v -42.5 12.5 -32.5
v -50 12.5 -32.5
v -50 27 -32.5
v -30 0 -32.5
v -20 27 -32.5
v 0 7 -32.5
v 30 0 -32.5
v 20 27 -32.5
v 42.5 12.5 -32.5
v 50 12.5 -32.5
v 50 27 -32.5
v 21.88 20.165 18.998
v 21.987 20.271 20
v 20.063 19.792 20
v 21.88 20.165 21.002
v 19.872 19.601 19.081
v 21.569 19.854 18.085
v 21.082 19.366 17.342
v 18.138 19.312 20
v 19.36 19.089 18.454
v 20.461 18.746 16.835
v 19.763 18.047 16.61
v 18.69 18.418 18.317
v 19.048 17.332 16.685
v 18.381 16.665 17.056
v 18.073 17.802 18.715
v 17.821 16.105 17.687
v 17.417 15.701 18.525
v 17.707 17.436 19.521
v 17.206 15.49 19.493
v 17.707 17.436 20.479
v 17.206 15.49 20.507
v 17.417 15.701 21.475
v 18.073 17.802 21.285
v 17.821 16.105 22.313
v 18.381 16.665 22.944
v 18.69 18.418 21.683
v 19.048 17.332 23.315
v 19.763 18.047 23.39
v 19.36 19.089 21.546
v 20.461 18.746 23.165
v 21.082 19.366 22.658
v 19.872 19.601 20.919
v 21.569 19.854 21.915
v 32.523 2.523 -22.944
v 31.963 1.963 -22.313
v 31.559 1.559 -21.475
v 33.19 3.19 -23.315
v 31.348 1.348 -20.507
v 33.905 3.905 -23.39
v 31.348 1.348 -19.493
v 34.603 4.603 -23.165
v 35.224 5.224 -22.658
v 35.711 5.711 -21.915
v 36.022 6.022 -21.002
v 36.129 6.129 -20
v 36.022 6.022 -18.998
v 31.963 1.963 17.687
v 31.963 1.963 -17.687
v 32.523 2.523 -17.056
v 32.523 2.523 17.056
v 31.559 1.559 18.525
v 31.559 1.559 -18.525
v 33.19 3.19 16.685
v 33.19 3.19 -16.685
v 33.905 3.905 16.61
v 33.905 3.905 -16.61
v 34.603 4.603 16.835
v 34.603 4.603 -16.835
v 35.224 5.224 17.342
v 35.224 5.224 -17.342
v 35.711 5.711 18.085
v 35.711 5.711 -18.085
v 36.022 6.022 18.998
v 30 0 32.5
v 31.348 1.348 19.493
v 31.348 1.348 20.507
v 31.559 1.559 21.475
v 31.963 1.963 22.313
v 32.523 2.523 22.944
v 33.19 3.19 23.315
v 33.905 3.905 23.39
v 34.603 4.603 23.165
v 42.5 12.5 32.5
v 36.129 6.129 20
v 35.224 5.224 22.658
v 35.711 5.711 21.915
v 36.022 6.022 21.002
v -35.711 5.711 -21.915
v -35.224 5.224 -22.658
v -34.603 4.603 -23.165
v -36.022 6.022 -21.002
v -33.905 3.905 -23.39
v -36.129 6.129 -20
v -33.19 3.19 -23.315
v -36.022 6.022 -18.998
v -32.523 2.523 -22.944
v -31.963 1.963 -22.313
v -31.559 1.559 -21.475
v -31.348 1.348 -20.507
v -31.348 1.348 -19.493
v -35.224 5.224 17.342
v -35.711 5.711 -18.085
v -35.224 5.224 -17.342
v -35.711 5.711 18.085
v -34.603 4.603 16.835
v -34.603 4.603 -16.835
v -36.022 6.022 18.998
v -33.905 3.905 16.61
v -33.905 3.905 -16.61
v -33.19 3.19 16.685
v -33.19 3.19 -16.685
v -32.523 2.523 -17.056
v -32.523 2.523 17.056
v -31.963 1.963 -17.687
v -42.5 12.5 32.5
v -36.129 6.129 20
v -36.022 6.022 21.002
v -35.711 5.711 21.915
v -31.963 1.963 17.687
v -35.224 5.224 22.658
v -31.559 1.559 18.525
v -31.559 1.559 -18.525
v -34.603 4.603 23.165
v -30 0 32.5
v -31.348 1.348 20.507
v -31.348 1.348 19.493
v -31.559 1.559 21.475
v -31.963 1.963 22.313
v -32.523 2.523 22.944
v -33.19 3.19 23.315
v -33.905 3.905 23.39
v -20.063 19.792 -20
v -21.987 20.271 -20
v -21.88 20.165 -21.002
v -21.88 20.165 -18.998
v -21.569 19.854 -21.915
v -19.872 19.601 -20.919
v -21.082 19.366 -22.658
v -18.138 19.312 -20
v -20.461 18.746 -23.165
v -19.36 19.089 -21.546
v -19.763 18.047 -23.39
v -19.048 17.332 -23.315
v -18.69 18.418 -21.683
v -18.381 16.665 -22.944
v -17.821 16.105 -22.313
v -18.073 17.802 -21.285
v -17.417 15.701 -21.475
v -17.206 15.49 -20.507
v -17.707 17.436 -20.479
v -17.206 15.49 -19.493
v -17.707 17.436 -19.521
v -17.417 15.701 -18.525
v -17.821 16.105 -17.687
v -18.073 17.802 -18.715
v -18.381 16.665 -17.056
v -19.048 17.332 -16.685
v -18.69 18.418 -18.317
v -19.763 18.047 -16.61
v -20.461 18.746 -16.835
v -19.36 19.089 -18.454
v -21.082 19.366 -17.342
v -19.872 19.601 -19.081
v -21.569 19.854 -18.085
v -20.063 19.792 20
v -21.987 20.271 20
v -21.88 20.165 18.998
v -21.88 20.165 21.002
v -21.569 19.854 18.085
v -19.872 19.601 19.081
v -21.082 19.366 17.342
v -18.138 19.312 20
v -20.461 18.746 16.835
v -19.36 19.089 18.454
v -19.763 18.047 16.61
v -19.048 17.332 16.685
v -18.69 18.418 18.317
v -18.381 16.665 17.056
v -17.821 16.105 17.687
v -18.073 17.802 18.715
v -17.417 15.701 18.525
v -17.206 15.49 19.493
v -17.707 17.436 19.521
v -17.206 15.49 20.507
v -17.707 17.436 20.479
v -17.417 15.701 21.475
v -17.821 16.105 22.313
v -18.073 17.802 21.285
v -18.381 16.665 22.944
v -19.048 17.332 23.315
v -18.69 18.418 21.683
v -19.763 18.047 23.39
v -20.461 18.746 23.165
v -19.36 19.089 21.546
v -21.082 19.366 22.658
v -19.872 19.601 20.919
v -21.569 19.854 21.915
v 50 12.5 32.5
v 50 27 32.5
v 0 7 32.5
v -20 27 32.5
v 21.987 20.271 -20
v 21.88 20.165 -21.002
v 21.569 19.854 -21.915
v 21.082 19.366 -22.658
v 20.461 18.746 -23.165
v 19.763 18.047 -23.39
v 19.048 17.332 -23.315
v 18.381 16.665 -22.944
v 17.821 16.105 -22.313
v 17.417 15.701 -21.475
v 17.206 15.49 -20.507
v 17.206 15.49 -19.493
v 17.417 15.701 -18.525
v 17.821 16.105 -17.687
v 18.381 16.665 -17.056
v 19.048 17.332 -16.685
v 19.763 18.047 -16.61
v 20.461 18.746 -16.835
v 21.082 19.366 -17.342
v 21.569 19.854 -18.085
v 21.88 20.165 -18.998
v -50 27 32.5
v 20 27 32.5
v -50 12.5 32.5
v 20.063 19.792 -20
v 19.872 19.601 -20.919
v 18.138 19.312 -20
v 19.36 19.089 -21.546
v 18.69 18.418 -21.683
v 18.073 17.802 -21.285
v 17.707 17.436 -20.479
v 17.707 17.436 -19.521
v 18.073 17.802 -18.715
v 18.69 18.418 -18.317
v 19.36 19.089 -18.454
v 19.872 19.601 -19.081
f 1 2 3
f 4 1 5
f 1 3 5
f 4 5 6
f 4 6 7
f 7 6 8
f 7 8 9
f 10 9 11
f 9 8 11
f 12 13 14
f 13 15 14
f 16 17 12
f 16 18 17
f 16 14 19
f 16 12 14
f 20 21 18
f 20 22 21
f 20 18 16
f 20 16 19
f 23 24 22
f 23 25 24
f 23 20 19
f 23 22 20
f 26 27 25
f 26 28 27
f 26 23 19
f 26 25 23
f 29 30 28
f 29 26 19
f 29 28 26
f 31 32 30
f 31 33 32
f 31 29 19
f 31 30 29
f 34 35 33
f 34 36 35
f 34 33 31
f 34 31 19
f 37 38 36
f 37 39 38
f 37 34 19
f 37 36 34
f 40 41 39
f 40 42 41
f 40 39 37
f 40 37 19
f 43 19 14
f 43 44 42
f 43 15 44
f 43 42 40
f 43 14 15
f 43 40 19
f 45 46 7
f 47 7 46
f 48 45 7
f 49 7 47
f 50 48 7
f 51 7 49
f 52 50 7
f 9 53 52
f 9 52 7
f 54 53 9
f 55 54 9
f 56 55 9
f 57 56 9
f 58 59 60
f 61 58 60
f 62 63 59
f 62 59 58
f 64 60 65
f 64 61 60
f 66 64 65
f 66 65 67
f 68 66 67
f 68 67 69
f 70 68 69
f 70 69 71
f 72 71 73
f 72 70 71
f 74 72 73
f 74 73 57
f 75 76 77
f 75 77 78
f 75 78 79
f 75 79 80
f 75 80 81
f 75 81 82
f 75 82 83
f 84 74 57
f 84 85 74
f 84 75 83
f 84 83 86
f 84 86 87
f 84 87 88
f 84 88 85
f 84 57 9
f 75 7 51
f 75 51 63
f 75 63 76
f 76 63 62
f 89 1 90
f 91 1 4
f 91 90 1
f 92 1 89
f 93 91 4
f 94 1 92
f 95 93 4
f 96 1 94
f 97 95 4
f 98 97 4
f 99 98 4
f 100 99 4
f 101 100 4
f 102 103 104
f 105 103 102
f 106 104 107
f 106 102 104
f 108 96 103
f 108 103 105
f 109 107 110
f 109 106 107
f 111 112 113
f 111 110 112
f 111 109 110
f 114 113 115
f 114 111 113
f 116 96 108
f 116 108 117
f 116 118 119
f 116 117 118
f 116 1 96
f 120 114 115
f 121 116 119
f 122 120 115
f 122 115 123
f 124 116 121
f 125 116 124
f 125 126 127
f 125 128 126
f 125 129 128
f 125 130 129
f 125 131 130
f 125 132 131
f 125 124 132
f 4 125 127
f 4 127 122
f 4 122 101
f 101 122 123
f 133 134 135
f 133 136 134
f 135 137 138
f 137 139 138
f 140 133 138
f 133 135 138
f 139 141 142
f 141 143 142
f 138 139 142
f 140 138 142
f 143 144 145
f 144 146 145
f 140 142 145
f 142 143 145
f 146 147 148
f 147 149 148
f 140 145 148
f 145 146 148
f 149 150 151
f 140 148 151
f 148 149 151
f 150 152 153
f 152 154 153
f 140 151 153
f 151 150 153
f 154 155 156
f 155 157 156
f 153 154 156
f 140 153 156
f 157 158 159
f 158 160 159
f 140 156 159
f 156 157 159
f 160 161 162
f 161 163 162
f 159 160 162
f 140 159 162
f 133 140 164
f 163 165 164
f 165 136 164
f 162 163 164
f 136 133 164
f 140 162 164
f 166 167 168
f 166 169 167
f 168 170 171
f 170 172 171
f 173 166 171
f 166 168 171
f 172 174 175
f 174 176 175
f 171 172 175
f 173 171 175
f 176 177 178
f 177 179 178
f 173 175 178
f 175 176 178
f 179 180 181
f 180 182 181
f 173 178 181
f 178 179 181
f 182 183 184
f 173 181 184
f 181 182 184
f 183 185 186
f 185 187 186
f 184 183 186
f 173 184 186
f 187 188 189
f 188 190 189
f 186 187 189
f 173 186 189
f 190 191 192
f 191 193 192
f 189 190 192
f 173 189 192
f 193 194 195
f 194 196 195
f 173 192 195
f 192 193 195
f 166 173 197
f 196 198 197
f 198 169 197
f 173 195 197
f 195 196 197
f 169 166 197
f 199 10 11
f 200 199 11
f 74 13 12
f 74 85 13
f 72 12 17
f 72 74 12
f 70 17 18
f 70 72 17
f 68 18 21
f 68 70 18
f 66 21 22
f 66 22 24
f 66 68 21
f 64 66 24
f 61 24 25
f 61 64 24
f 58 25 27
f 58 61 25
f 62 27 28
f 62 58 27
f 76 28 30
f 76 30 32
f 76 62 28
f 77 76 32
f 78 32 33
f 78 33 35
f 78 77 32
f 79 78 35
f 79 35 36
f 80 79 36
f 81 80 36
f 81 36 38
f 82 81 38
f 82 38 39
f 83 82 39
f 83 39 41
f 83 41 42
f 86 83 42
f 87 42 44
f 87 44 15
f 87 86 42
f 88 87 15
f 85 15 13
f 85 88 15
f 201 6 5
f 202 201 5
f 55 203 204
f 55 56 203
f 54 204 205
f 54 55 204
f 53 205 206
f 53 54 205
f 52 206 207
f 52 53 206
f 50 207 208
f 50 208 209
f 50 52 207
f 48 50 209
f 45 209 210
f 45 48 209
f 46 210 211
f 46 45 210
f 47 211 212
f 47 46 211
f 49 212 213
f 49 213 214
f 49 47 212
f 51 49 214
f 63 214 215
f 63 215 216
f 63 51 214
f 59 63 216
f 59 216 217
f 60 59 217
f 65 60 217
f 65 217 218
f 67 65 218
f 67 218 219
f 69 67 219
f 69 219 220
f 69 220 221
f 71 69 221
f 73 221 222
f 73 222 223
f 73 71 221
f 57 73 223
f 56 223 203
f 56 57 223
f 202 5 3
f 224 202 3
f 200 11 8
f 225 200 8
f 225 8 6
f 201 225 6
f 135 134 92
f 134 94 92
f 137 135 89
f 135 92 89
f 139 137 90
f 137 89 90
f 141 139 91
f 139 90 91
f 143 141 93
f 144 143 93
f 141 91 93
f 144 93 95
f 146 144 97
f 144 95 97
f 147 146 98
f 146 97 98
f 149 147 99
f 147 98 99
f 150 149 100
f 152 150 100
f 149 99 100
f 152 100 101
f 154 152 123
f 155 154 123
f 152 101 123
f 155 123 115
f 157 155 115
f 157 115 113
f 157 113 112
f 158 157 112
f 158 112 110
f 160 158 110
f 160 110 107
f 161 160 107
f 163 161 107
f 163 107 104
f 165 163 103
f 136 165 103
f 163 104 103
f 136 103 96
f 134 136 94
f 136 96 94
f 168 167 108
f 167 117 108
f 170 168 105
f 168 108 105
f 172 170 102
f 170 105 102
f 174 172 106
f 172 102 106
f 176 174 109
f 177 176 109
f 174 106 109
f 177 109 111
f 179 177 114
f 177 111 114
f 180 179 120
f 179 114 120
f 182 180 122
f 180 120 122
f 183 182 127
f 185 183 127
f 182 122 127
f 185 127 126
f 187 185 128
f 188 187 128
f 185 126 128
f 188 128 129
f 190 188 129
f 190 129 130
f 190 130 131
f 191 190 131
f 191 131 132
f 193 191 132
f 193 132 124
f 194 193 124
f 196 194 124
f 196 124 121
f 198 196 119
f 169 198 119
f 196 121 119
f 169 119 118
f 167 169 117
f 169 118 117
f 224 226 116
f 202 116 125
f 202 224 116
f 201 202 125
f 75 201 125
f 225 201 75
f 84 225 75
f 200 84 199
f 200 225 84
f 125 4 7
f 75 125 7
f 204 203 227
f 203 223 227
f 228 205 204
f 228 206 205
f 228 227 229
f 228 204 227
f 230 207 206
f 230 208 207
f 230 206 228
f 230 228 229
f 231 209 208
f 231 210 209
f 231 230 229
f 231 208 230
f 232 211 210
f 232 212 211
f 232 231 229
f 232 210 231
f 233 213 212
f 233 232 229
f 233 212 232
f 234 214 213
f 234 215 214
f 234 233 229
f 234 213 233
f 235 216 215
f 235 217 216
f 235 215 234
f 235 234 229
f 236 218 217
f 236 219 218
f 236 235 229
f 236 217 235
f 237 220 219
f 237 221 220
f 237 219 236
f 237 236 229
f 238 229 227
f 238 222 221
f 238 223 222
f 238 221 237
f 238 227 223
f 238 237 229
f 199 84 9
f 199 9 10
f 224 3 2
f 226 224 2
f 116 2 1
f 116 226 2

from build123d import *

# Parameters (mm, degrees)
BOSS_EXTRUDE1_DEPTH            = 32.5
TALADRO_ROSCADO_M86_AT_2_COUNT = 2
TALADRO_ROSCADO_M86_AT_2_PITCH = 40


with BuildPart() as part:
    # Sketch1 → Boss-Extrude1 (new body, symmetric)
    with BuildSketch(Plane.XY):
        Polygon((-30, 0), (30, 0), (42.5, 12.5), (50, 12.5), (50, 27), (20, 27), (0, 7), (-20, 27), (-50, 27), (-50, 12.5), (-42.5, 12.5), align=None)
    extrude(amount=BOSS_EXTRUDE1_DEPTH, both=True)

    # Croquis12 → Taladro roscado M86 (revolve, cut)
    with BuildSketch(Plane(origin=(33.725048023, 3.725048023, 20), x_dir=(0.707106781, 0.707106781, 0), z_dir=(0, 0, 1))):
        Polygon((0, 0), (0, 22.042926105), (3.4, 20), (3.4, 0), align=None)
    taladro_roscado_m86 = revolve(axis=Axis((38.215176084, -0.765080037, 20), (-0.707106781, 0.707106781, 0)), mode=Mode.SUBTRACT)

    # Taladro roscado M86 at 2: Taladro roscado M86 ×2
    with Locations(*[(0, 0, -i * TALADRO_ROSCADO_M86_AT_2_PITCH) for i in range(1, TALADRO_ROSCADO_M86_AT_2_COUNT)]):
        add(taladro_roscado_m86, mode=Mode.SUBTRACT)

    # Simetría3: Taladro roscado M86 across plane
    add(taladro_roscado_m86.mirror(Plane(origin=(0, 0, 0), x_dir=(0, 0, 1), z_dir=(1, 0, 0))), mode=Mode.SUBTRACT)

    # Simetría3 copy 1 sketch → Simetría3 copy 1 (revolve, cut)
    with BuildSketch(Plane(origin=(-33.725048023, 3.725048023, -20), x_dir=(-0.707106781, 0.707106781, 0), z_dir=(0, 0, 1))):
        Polygon((0, 0), (0, -22.042926105), (3.4, -20), (3.4, 0), align=None)
    revolve(axis=Axis((-38.215176084, -0.765080037, -20), (-0.707106781, -0.707106781, 0)), mode=Mode.SUBTRACT)


solid = part.part
